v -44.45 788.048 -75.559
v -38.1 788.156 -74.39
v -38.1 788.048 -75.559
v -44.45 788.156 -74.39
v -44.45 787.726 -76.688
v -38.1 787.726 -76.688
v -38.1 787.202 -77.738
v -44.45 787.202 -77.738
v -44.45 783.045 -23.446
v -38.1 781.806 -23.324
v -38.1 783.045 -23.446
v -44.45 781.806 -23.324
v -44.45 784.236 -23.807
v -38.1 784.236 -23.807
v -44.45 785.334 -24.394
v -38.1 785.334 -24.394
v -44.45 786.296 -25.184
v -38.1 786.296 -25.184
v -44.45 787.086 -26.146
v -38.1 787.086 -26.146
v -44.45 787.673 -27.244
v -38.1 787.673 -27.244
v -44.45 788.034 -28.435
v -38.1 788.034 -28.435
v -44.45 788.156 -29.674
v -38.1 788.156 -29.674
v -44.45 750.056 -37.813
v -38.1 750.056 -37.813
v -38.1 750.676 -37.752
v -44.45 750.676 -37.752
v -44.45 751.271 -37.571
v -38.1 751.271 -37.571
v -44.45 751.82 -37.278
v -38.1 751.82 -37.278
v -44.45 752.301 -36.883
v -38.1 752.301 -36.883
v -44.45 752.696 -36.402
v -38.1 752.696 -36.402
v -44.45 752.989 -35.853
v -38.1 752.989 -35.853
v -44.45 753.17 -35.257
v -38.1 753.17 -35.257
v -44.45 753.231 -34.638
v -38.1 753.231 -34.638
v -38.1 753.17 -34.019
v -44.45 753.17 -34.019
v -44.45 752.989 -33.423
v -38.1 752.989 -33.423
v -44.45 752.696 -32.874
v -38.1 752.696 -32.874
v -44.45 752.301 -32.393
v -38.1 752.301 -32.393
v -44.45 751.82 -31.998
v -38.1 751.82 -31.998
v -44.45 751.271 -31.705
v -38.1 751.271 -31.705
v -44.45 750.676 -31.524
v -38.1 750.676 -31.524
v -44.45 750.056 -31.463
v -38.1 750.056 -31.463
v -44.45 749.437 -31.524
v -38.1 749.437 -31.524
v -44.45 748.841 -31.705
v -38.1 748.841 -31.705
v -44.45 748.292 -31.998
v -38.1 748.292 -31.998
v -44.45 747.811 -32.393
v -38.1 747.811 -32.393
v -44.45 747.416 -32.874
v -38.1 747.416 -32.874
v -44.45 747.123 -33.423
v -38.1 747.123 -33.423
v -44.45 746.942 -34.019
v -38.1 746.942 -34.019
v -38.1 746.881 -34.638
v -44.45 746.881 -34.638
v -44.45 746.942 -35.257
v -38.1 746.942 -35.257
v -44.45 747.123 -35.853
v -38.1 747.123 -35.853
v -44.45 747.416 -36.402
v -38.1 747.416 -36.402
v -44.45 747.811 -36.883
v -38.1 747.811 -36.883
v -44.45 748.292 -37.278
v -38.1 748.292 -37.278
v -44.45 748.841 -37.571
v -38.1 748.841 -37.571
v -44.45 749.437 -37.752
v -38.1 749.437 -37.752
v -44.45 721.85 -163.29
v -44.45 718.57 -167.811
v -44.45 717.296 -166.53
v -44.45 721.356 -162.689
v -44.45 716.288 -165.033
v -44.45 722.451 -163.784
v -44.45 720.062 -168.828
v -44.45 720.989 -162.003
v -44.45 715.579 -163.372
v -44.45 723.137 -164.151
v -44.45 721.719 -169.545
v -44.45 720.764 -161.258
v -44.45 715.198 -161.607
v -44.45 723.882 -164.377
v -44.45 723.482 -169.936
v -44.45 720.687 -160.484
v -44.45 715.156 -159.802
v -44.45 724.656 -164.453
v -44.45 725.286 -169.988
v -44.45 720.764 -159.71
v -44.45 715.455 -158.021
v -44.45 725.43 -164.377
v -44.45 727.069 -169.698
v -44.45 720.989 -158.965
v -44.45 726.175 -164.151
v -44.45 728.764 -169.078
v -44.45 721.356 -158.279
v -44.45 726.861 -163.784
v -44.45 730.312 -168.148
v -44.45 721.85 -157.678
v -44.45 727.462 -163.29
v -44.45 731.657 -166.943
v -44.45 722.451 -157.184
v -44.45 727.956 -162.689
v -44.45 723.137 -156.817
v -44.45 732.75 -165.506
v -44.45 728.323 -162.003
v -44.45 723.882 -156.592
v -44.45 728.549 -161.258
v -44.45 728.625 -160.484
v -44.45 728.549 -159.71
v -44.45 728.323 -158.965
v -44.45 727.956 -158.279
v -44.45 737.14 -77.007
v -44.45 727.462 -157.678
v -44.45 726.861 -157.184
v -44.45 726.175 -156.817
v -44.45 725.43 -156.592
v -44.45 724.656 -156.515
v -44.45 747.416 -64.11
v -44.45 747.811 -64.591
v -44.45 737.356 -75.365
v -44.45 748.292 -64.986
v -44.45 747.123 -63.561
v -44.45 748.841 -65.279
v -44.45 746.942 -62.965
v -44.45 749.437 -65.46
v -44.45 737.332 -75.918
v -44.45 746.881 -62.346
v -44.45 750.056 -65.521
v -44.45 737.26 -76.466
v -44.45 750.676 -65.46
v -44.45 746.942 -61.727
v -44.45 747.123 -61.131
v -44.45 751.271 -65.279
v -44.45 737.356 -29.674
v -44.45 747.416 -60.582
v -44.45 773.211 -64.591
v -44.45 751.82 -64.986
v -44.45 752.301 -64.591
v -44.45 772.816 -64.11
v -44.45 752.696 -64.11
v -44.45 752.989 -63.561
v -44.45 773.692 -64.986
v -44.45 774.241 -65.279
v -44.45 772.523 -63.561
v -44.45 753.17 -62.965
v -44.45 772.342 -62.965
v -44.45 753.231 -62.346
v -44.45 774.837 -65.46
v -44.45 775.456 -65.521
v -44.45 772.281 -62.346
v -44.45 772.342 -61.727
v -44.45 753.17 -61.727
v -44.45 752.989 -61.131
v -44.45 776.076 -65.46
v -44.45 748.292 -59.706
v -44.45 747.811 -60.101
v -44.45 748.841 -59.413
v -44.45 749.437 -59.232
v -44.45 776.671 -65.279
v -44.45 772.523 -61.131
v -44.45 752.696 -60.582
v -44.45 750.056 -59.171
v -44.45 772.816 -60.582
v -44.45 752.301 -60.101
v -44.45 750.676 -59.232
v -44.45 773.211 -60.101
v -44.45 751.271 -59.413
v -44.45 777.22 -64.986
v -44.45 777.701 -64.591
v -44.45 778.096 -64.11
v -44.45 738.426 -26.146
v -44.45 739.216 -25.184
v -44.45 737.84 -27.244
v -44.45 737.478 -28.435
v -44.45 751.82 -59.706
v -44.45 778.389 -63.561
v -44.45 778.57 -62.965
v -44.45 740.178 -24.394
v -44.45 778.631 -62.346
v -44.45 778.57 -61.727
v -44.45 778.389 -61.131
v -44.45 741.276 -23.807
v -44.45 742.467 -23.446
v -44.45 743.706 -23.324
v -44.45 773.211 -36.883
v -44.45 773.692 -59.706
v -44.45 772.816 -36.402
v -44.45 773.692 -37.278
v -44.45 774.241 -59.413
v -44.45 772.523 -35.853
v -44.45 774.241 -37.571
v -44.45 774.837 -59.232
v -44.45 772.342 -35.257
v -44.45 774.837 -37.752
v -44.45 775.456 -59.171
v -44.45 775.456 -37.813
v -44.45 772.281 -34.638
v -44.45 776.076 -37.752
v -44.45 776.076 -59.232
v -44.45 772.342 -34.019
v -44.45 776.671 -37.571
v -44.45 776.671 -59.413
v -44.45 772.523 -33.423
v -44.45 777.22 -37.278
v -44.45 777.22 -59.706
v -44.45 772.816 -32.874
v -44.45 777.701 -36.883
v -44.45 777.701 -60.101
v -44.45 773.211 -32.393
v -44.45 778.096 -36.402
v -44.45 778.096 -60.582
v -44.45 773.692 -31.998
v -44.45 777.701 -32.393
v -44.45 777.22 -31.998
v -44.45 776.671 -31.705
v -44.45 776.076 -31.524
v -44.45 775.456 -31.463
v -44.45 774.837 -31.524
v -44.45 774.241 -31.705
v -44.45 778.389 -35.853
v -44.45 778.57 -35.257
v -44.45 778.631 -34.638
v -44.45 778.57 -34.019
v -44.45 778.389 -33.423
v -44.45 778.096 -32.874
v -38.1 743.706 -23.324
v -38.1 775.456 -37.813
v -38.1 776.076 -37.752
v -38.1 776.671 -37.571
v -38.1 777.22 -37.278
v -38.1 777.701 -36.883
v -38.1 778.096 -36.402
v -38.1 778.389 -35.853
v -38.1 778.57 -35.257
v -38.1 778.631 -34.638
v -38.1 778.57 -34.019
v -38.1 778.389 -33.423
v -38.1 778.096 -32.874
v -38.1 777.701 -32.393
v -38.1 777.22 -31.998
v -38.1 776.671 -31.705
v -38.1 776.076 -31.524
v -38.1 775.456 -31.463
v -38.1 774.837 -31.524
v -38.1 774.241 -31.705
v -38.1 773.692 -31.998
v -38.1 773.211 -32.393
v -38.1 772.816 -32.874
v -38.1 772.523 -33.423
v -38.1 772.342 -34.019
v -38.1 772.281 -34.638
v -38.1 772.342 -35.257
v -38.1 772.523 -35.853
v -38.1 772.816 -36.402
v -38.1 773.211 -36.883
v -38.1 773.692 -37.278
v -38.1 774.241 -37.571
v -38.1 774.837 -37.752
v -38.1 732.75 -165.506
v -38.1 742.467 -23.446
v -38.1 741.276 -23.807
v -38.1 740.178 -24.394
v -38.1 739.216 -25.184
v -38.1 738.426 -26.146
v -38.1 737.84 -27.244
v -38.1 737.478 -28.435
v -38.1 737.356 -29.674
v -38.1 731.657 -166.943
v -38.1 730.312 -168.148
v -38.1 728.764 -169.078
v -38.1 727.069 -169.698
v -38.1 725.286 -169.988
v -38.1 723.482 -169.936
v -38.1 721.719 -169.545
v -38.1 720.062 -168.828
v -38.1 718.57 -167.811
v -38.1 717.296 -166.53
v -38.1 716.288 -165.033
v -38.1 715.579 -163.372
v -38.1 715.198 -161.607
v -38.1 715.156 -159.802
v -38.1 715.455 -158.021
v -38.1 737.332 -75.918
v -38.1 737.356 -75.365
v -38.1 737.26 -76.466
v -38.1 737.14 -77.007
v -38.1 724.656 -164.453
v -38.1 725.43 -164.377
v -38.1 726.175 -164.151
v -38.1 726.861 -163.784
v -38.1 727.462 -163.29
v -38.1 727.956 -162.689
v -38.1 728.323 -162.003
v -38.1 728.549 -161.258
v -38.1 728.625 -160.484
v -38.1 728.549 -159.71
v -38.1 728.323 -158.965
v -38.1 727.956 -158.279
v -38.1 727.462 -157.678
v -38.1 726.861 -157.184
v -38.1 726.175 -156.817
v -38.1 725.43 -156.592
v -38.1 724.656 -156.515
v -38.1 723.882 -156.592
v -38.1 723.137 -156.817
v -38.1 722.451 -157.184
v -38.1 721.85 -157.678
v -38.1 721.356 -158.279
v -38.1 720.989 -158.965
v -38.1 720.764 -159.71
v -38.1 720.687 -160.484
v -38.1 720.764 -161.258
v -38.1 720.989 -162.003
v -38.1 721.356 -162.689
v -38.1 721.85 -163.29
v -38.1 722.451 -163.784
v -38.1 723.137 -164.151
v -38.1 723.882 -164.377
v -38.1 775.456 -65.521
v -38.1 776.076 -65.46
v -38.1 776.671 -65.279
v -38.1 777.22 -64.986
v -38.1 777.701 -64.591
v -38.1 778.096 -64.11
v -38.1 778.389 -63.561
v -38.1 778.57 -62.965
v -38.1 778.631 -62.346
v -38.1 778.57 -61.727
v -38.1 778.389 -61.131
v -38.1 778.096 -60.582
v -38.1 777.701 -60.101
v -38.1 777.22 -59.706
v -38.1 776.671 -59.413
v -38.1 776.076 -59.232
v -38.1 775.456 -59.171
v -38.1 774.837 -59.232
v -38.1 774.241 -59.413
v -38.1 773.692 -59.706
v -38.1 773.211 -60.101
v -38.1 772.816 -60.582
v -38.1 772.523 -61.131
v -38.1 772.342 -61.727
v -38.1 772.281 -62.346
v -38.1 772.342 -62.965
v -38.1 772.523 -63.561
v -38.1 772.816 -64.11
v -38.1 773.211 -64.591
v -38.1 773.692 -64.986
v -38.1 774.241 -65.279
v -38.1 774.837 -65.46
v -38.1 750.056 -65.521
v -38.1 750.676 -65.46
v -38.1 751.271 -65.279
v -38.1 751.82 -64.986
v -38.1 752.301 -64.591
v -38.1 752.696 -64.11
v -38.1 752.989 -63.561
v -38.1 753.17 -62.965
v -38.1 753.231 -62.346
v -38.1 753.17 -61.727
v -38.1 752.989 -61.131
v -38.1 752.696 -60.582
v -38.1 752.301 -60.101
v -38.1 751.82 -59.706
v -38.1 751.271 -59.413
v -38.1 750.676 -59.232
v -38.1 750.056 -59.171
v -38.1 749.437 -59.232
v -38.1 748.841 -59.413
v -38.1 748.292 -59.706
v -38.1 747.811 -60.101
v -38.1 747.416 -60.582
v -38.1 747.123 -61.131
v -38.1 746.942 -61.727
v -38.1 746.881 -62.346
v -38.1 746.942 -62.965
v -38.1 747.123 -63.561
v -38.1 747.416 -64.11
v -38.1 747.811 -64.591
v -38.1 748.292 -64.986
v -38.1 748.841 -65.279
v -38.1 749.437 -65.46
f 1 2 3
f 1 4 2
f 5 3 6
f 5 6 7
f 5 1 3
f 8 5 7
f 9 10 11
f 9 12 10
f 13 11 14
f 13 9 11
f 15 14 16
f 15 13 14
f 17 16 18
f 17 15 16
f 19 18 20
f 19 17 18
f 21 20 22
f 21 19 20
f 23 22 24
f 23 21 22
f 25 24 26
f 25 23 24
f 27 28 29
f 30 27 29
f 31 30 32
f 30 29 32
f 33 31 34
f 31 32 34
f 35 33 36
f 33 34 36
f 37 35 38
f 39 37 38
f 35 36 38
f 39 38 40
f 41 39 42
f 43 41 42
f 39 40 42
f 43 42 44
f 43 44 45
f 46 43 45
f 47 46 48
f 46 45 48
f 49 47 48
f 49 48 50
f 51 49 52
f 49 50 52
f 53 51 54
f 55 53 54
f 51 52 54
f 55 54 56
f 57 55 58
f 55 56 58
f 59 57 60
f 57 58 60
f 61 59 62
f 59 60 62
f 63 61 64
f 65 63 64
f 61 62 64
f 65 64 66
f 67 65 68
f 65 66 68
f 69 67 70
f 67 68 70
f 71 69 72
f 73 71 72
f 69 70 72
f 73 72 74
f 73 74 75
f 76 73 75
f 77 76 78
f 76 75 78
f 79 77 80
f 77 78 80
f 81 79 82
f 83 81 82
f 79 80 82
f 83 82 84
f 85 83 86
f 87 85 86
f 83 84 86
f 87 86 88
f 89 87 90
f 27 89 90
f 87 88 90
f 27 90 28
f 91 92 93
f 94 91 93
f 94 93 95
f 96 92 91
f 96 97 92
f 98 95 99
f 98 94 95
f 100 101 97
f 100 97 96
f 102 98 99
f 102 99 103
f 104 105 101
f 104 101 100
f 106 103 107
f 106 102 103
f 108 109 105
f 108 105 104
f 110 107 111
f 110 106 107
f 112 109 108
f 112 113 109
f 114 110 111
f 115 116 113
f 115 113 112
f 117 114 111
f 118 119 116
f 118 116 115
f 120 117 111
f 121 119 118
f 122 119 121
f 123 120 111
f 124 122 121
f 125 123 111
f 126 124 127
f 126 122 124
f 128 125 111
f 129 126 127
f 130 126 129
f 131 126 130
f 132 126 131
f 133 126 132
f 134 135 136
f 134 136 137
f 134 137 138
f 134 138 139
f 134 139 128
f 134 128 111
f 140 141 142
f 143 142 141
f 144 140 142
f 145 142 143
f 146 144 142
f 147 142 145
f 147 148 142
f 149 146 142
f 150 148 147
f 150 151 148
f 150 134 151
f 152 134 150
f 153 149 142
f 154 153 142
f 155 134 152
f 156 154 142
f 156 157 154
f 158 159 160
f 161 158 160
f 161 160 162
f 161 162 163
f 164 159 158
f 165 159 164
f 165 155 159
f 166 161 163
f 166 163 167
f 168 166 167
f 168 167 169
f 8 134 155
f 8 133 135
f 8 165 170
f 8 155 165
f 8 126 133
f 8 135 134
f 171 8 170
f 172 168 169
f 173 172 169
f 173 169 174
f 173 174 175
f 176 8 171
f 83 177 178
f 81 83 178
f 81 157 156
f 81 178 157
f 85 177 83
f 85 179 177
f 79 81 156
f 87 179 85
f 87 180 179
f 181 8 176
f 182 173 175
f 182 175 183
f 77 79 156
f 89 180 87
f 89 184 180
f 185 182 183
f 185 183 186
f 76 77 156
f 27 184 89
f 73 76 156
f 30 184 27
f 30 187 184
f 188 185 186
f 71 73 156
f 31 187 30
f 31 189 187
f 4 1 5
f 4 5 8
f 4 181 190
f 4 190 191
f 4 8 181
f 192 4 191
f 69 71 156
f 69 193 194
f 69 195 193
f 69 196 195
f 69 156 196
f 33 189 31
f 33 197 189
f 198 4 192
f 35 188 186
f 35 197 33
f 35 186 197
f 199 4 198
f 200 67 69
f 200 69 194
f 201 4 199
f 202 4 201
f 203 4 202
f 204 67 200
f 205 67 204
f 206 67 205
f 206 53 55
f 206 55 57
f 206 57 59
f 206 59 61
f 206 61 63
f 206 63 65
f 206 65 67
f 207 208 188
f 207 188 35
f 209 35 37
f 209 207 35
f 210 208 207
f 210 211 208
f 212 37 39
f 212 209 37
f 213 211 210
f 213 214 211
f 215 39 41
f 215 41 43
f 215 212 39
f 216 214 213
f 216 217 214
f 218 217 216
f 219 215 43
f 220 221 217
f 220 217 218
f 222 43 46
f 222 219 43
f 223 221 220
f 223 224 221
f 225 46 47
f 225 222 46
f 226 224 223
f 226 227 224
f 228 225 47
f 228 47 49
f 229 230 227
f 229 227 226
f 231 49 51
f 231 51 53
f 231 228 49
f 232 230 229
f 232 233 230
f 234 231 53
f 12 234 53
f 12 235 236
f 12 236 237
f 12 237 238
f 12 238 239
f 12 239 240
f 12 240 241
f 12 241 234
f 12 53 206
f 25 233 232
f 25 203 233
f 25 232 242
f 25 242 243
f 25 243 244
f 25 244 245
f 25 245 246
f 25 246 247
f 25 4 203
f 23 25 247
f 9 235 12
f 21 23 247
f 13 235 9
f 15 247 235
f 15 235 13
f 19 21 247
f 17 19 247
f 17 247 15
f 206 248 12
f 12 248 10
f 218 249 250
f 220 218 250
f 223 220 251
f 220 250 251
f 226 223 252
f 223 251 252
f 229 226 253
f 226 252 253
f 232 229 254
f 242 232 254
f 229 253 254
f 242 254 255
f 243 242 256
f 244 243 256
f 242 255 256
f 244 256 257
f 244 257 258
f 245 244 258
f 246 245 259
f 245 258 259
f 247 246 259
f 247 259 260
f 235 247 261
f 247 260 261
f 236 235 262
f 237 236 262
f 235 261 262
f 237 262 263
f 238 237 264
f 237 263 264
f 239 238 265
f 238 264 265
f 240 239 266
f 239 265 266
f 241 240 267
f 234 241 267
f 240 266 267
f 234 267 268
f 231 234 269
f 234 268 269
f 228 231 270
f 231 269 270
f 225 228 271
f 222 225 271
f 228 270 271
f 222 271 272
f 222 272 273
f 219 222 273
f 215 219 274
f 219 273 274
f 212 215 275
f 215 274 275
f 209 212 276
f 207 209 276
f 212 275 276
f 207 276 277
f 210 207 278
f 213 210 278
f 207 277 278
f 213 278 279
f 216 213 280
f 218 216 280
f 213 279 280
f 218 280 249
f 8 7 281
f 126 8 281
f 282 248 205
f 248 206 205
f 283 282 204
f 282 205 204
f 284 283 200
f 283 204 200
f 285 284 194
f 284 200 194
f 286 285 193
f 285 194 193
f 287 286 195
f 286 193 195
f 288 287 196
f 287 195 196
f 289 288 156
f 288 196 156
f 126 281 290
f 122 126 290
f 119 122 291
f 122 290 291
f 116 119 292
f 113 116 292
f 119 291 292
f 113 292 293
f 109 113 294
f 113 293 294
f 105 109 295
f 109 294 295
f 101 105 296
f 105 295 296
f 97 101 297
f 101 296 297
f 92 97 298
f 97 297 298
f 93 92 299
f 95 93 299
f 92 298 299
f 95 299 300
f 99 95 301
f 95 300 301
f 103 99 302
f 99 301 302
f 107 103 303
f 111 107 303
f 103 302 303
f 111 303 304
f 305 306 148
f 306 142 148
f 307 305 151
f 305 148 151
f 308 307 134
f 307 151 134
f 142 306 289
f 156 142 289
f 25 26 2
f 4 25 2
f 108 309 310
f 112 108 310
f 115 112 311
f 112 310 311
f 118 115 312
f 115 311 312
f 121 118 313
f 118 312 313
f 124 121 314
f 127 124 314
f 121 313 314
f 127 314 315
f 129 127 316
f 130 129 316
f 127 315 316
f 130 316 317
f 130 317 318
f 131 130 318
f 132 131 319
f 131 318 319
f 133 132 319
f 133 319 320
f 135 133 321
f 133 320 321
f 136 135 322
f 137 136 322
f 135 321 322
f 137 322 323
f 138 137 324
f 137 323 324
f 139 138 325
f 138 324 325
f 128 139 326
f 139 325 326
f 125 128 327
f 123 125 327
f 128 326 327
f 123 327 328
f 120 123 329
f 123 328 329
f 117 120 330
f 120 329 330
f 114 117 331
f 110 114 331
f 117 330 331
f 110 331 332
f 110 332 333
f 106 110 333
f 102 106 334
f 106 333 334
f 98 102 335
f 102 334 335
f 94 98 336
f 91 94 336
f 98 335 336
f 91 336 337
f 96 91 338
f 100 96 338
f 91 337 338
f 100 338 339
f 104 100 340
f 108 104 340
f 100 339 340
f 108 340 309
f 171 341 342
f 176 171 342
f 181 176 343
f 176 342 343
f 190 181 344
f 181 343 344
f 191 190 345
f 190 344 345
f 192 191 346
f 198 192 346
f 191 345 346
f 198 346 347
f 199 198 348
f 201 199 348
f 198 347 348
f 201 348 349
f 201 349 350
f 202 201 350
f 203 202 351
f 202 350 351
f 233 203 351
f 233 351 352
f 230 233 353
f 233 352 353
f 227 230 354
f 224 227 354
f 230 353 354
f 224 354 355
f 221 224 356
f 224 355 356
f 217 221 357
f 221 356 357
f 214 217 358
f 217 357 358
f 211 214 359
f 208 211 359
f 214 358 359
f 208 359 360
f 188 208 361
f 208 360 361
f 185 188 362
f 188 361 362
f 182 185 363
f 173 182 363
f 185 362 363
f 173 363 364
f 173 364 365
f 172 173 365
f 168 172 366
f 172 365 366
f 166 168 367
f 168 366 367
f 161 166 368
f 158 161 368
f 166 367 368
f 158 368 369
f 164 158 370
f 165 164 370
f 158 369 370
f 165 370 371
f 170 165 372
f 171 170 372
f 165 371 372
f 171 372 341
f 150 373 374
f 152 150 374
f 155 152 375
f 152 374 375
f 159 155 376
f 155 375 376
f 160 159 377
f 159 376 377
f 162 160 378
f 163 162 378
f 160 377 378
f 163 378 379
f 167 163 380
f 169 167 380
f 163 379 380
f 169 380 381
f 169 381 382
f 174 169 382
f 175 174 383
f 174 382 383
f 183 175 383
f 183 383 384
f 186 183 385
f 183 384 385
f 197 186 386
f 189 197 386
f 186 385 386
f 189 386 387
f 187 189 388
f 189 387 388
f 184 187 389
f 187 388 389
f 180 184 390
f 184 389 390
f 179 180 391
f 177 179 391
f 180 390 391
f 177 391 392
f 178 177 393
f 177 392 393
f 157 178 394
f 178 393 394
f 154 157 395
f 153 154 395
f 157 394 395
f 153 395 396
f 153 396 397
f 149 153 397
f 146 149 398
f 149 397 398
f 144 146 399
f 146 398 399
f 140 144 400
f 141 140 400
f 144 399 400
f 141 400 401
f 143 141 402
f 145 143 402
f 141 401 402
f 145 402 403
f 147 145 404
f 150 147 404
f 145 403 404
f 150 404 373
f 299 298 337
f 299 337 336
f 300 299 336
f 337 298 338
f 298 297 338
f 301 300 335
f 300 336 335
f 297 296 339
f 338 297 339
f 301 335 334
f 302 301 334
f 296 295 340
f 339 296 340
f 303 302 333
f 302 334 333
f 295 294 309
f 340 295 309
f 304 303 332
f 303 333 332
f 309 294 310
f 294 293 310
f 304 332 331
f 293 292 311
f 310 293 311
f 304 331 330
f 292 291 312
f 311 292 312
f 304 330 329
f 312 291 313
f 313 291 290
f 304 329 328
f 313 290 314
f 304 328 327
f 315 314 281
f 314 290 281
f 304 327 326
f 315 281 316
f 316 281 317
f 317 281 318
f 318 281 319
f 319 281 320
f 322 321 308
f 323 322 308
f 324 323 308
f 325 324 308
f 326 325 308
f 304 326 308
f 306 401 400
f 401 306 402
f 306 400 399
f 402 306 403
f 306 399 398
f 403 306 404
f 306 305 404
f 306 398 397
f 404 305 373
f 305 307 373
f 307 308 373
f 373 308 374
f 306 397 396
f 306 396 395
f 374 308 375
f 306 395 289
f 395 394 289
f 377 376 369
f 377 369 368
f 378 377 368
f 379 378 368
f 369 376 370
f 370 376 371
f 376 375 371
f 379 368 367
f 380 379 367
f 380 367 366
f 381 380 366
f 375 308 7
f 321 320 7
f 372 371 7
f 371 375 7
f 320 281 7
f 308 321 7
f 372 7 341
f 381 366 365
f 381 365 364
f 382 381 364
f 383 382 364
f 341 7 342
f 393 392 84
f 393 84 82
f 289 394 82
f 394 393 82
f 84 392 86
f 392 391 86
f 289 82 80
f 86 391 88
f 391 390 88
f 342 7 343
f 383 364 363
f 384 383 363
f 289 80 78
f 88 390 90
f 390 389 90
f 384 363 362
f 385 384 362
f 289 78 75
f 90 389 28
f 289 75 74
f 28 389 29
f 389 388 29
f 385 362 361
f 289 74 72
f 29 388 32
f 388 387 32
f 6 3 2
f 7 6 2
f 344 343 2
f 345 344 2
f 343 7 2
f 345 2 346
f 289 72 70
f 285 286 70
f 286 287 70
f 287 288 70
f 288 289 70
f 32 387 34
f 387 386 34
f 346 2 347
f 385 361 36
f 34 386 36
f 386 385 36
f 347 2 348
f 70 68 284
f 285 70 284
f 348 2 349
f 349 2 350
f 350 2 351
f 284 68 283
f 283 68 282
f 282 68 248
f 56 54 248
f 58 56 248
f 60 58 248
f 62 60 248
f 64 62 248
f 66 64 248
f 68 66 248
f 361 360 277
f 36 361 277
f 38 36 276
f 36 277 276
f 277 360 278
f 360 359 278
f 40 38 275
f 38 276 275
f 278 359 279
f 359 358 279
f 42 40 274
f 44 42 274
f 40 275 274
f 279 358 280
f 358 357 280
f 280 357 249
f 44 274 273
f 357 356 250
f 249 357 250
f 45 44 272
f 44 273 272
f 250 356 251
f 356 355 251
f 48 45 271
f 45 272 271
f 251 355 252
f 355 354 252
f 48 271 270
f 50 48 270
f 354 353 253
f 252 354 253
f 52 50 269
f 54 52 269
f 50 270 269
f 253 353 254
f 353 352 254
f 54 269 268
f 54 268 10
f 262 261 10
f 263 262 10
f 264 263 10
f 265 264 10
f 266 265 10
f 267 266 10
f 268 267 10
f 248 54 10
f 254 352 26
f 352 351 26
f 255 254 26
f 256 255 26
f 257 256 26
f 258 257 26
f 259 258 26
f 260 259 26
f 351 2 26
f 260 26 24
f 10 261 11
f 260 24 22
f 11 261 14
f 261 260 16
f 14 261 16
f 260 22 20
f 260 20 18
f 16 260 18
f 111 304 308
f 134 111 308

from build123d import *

# Parameters (mm, degrees)
BOSS_EXTRUDE1_START = -38.1
SKETCH1_R           = 3.968749999
SKETCH1_R_2         = 3.175
SKETCH1_R_3         = 3.174999999
BOSS_EXTRUDE1_DEPTH = 6.35
FILLET1_R           = 6.35


with BuildPart() as part:
    # Sketch1 → Boss-Extrude1 (new body)
    with BuildSketch(Plane(origin=(0, 0, 0), x_dir=(0, 0, -1), z_dir=(1, 0, 0)).offset(BOSS_EXTRUDE1_START)):
        with BuildLine():
            Line((23.324046982, 737.356140976), (23.324046982, 788.156140976))
            Line((23.324046982, 788.156140976), (76.2, 788.156140976))
            Line((76.2, 788.156140976), (165.505551403, 732.749973094))
            ThreePointArc((165.505551403, 732.749973094), (169.225626516, 720.873230423), (158.021191738, 715.455055766))
            Line((158.021191738, 715.455055766), (76.2, 737.356140976))
            Line((76.2, 737.356140976), (23.324046982, 737.356140976))
        make_face()
        with Locations((160.484046982, 724.656140976)):
            Circle(SKETCH1_R, mode=Mode.SUBTRACT)
        with Locations((62.346011746, 750.056140976)):
            Circle(SKETCH1_R_2, mode=Mode.SUBTRACT)
        with Locations((34.638035237, 750.056140976)):
            Circle(SKETCH1_R_3, mode=Mode.SUBTRACT)
        with Locations((34.638035237, 775.456140976)):
            Circle(SKETCH1_R_3, mode=Mode.SUBTRACT)
        with Locations((62.346011746, 775.456140976)):
            Circle(SKETCH1_R_2, mode=Mode.SUBTRACT)
    extrude(amount=-BOSS_EXTRUDE1_DEPTH)

    # Fillet1
    fillet1_edges = [part.edges().sort_by_distance(p)[0] for p in [
        (-41.275, 788.156140976, -76.2),
        (-41.275, 788.156140976, -23.324046982),
        (-41.275, 737.356140976, -23.324046982),
        (-41.275, 737.356140976, -76.2),
    ]]
    fillet(fillet1_edges, radius=FILLET1_R)


solid = part.part
